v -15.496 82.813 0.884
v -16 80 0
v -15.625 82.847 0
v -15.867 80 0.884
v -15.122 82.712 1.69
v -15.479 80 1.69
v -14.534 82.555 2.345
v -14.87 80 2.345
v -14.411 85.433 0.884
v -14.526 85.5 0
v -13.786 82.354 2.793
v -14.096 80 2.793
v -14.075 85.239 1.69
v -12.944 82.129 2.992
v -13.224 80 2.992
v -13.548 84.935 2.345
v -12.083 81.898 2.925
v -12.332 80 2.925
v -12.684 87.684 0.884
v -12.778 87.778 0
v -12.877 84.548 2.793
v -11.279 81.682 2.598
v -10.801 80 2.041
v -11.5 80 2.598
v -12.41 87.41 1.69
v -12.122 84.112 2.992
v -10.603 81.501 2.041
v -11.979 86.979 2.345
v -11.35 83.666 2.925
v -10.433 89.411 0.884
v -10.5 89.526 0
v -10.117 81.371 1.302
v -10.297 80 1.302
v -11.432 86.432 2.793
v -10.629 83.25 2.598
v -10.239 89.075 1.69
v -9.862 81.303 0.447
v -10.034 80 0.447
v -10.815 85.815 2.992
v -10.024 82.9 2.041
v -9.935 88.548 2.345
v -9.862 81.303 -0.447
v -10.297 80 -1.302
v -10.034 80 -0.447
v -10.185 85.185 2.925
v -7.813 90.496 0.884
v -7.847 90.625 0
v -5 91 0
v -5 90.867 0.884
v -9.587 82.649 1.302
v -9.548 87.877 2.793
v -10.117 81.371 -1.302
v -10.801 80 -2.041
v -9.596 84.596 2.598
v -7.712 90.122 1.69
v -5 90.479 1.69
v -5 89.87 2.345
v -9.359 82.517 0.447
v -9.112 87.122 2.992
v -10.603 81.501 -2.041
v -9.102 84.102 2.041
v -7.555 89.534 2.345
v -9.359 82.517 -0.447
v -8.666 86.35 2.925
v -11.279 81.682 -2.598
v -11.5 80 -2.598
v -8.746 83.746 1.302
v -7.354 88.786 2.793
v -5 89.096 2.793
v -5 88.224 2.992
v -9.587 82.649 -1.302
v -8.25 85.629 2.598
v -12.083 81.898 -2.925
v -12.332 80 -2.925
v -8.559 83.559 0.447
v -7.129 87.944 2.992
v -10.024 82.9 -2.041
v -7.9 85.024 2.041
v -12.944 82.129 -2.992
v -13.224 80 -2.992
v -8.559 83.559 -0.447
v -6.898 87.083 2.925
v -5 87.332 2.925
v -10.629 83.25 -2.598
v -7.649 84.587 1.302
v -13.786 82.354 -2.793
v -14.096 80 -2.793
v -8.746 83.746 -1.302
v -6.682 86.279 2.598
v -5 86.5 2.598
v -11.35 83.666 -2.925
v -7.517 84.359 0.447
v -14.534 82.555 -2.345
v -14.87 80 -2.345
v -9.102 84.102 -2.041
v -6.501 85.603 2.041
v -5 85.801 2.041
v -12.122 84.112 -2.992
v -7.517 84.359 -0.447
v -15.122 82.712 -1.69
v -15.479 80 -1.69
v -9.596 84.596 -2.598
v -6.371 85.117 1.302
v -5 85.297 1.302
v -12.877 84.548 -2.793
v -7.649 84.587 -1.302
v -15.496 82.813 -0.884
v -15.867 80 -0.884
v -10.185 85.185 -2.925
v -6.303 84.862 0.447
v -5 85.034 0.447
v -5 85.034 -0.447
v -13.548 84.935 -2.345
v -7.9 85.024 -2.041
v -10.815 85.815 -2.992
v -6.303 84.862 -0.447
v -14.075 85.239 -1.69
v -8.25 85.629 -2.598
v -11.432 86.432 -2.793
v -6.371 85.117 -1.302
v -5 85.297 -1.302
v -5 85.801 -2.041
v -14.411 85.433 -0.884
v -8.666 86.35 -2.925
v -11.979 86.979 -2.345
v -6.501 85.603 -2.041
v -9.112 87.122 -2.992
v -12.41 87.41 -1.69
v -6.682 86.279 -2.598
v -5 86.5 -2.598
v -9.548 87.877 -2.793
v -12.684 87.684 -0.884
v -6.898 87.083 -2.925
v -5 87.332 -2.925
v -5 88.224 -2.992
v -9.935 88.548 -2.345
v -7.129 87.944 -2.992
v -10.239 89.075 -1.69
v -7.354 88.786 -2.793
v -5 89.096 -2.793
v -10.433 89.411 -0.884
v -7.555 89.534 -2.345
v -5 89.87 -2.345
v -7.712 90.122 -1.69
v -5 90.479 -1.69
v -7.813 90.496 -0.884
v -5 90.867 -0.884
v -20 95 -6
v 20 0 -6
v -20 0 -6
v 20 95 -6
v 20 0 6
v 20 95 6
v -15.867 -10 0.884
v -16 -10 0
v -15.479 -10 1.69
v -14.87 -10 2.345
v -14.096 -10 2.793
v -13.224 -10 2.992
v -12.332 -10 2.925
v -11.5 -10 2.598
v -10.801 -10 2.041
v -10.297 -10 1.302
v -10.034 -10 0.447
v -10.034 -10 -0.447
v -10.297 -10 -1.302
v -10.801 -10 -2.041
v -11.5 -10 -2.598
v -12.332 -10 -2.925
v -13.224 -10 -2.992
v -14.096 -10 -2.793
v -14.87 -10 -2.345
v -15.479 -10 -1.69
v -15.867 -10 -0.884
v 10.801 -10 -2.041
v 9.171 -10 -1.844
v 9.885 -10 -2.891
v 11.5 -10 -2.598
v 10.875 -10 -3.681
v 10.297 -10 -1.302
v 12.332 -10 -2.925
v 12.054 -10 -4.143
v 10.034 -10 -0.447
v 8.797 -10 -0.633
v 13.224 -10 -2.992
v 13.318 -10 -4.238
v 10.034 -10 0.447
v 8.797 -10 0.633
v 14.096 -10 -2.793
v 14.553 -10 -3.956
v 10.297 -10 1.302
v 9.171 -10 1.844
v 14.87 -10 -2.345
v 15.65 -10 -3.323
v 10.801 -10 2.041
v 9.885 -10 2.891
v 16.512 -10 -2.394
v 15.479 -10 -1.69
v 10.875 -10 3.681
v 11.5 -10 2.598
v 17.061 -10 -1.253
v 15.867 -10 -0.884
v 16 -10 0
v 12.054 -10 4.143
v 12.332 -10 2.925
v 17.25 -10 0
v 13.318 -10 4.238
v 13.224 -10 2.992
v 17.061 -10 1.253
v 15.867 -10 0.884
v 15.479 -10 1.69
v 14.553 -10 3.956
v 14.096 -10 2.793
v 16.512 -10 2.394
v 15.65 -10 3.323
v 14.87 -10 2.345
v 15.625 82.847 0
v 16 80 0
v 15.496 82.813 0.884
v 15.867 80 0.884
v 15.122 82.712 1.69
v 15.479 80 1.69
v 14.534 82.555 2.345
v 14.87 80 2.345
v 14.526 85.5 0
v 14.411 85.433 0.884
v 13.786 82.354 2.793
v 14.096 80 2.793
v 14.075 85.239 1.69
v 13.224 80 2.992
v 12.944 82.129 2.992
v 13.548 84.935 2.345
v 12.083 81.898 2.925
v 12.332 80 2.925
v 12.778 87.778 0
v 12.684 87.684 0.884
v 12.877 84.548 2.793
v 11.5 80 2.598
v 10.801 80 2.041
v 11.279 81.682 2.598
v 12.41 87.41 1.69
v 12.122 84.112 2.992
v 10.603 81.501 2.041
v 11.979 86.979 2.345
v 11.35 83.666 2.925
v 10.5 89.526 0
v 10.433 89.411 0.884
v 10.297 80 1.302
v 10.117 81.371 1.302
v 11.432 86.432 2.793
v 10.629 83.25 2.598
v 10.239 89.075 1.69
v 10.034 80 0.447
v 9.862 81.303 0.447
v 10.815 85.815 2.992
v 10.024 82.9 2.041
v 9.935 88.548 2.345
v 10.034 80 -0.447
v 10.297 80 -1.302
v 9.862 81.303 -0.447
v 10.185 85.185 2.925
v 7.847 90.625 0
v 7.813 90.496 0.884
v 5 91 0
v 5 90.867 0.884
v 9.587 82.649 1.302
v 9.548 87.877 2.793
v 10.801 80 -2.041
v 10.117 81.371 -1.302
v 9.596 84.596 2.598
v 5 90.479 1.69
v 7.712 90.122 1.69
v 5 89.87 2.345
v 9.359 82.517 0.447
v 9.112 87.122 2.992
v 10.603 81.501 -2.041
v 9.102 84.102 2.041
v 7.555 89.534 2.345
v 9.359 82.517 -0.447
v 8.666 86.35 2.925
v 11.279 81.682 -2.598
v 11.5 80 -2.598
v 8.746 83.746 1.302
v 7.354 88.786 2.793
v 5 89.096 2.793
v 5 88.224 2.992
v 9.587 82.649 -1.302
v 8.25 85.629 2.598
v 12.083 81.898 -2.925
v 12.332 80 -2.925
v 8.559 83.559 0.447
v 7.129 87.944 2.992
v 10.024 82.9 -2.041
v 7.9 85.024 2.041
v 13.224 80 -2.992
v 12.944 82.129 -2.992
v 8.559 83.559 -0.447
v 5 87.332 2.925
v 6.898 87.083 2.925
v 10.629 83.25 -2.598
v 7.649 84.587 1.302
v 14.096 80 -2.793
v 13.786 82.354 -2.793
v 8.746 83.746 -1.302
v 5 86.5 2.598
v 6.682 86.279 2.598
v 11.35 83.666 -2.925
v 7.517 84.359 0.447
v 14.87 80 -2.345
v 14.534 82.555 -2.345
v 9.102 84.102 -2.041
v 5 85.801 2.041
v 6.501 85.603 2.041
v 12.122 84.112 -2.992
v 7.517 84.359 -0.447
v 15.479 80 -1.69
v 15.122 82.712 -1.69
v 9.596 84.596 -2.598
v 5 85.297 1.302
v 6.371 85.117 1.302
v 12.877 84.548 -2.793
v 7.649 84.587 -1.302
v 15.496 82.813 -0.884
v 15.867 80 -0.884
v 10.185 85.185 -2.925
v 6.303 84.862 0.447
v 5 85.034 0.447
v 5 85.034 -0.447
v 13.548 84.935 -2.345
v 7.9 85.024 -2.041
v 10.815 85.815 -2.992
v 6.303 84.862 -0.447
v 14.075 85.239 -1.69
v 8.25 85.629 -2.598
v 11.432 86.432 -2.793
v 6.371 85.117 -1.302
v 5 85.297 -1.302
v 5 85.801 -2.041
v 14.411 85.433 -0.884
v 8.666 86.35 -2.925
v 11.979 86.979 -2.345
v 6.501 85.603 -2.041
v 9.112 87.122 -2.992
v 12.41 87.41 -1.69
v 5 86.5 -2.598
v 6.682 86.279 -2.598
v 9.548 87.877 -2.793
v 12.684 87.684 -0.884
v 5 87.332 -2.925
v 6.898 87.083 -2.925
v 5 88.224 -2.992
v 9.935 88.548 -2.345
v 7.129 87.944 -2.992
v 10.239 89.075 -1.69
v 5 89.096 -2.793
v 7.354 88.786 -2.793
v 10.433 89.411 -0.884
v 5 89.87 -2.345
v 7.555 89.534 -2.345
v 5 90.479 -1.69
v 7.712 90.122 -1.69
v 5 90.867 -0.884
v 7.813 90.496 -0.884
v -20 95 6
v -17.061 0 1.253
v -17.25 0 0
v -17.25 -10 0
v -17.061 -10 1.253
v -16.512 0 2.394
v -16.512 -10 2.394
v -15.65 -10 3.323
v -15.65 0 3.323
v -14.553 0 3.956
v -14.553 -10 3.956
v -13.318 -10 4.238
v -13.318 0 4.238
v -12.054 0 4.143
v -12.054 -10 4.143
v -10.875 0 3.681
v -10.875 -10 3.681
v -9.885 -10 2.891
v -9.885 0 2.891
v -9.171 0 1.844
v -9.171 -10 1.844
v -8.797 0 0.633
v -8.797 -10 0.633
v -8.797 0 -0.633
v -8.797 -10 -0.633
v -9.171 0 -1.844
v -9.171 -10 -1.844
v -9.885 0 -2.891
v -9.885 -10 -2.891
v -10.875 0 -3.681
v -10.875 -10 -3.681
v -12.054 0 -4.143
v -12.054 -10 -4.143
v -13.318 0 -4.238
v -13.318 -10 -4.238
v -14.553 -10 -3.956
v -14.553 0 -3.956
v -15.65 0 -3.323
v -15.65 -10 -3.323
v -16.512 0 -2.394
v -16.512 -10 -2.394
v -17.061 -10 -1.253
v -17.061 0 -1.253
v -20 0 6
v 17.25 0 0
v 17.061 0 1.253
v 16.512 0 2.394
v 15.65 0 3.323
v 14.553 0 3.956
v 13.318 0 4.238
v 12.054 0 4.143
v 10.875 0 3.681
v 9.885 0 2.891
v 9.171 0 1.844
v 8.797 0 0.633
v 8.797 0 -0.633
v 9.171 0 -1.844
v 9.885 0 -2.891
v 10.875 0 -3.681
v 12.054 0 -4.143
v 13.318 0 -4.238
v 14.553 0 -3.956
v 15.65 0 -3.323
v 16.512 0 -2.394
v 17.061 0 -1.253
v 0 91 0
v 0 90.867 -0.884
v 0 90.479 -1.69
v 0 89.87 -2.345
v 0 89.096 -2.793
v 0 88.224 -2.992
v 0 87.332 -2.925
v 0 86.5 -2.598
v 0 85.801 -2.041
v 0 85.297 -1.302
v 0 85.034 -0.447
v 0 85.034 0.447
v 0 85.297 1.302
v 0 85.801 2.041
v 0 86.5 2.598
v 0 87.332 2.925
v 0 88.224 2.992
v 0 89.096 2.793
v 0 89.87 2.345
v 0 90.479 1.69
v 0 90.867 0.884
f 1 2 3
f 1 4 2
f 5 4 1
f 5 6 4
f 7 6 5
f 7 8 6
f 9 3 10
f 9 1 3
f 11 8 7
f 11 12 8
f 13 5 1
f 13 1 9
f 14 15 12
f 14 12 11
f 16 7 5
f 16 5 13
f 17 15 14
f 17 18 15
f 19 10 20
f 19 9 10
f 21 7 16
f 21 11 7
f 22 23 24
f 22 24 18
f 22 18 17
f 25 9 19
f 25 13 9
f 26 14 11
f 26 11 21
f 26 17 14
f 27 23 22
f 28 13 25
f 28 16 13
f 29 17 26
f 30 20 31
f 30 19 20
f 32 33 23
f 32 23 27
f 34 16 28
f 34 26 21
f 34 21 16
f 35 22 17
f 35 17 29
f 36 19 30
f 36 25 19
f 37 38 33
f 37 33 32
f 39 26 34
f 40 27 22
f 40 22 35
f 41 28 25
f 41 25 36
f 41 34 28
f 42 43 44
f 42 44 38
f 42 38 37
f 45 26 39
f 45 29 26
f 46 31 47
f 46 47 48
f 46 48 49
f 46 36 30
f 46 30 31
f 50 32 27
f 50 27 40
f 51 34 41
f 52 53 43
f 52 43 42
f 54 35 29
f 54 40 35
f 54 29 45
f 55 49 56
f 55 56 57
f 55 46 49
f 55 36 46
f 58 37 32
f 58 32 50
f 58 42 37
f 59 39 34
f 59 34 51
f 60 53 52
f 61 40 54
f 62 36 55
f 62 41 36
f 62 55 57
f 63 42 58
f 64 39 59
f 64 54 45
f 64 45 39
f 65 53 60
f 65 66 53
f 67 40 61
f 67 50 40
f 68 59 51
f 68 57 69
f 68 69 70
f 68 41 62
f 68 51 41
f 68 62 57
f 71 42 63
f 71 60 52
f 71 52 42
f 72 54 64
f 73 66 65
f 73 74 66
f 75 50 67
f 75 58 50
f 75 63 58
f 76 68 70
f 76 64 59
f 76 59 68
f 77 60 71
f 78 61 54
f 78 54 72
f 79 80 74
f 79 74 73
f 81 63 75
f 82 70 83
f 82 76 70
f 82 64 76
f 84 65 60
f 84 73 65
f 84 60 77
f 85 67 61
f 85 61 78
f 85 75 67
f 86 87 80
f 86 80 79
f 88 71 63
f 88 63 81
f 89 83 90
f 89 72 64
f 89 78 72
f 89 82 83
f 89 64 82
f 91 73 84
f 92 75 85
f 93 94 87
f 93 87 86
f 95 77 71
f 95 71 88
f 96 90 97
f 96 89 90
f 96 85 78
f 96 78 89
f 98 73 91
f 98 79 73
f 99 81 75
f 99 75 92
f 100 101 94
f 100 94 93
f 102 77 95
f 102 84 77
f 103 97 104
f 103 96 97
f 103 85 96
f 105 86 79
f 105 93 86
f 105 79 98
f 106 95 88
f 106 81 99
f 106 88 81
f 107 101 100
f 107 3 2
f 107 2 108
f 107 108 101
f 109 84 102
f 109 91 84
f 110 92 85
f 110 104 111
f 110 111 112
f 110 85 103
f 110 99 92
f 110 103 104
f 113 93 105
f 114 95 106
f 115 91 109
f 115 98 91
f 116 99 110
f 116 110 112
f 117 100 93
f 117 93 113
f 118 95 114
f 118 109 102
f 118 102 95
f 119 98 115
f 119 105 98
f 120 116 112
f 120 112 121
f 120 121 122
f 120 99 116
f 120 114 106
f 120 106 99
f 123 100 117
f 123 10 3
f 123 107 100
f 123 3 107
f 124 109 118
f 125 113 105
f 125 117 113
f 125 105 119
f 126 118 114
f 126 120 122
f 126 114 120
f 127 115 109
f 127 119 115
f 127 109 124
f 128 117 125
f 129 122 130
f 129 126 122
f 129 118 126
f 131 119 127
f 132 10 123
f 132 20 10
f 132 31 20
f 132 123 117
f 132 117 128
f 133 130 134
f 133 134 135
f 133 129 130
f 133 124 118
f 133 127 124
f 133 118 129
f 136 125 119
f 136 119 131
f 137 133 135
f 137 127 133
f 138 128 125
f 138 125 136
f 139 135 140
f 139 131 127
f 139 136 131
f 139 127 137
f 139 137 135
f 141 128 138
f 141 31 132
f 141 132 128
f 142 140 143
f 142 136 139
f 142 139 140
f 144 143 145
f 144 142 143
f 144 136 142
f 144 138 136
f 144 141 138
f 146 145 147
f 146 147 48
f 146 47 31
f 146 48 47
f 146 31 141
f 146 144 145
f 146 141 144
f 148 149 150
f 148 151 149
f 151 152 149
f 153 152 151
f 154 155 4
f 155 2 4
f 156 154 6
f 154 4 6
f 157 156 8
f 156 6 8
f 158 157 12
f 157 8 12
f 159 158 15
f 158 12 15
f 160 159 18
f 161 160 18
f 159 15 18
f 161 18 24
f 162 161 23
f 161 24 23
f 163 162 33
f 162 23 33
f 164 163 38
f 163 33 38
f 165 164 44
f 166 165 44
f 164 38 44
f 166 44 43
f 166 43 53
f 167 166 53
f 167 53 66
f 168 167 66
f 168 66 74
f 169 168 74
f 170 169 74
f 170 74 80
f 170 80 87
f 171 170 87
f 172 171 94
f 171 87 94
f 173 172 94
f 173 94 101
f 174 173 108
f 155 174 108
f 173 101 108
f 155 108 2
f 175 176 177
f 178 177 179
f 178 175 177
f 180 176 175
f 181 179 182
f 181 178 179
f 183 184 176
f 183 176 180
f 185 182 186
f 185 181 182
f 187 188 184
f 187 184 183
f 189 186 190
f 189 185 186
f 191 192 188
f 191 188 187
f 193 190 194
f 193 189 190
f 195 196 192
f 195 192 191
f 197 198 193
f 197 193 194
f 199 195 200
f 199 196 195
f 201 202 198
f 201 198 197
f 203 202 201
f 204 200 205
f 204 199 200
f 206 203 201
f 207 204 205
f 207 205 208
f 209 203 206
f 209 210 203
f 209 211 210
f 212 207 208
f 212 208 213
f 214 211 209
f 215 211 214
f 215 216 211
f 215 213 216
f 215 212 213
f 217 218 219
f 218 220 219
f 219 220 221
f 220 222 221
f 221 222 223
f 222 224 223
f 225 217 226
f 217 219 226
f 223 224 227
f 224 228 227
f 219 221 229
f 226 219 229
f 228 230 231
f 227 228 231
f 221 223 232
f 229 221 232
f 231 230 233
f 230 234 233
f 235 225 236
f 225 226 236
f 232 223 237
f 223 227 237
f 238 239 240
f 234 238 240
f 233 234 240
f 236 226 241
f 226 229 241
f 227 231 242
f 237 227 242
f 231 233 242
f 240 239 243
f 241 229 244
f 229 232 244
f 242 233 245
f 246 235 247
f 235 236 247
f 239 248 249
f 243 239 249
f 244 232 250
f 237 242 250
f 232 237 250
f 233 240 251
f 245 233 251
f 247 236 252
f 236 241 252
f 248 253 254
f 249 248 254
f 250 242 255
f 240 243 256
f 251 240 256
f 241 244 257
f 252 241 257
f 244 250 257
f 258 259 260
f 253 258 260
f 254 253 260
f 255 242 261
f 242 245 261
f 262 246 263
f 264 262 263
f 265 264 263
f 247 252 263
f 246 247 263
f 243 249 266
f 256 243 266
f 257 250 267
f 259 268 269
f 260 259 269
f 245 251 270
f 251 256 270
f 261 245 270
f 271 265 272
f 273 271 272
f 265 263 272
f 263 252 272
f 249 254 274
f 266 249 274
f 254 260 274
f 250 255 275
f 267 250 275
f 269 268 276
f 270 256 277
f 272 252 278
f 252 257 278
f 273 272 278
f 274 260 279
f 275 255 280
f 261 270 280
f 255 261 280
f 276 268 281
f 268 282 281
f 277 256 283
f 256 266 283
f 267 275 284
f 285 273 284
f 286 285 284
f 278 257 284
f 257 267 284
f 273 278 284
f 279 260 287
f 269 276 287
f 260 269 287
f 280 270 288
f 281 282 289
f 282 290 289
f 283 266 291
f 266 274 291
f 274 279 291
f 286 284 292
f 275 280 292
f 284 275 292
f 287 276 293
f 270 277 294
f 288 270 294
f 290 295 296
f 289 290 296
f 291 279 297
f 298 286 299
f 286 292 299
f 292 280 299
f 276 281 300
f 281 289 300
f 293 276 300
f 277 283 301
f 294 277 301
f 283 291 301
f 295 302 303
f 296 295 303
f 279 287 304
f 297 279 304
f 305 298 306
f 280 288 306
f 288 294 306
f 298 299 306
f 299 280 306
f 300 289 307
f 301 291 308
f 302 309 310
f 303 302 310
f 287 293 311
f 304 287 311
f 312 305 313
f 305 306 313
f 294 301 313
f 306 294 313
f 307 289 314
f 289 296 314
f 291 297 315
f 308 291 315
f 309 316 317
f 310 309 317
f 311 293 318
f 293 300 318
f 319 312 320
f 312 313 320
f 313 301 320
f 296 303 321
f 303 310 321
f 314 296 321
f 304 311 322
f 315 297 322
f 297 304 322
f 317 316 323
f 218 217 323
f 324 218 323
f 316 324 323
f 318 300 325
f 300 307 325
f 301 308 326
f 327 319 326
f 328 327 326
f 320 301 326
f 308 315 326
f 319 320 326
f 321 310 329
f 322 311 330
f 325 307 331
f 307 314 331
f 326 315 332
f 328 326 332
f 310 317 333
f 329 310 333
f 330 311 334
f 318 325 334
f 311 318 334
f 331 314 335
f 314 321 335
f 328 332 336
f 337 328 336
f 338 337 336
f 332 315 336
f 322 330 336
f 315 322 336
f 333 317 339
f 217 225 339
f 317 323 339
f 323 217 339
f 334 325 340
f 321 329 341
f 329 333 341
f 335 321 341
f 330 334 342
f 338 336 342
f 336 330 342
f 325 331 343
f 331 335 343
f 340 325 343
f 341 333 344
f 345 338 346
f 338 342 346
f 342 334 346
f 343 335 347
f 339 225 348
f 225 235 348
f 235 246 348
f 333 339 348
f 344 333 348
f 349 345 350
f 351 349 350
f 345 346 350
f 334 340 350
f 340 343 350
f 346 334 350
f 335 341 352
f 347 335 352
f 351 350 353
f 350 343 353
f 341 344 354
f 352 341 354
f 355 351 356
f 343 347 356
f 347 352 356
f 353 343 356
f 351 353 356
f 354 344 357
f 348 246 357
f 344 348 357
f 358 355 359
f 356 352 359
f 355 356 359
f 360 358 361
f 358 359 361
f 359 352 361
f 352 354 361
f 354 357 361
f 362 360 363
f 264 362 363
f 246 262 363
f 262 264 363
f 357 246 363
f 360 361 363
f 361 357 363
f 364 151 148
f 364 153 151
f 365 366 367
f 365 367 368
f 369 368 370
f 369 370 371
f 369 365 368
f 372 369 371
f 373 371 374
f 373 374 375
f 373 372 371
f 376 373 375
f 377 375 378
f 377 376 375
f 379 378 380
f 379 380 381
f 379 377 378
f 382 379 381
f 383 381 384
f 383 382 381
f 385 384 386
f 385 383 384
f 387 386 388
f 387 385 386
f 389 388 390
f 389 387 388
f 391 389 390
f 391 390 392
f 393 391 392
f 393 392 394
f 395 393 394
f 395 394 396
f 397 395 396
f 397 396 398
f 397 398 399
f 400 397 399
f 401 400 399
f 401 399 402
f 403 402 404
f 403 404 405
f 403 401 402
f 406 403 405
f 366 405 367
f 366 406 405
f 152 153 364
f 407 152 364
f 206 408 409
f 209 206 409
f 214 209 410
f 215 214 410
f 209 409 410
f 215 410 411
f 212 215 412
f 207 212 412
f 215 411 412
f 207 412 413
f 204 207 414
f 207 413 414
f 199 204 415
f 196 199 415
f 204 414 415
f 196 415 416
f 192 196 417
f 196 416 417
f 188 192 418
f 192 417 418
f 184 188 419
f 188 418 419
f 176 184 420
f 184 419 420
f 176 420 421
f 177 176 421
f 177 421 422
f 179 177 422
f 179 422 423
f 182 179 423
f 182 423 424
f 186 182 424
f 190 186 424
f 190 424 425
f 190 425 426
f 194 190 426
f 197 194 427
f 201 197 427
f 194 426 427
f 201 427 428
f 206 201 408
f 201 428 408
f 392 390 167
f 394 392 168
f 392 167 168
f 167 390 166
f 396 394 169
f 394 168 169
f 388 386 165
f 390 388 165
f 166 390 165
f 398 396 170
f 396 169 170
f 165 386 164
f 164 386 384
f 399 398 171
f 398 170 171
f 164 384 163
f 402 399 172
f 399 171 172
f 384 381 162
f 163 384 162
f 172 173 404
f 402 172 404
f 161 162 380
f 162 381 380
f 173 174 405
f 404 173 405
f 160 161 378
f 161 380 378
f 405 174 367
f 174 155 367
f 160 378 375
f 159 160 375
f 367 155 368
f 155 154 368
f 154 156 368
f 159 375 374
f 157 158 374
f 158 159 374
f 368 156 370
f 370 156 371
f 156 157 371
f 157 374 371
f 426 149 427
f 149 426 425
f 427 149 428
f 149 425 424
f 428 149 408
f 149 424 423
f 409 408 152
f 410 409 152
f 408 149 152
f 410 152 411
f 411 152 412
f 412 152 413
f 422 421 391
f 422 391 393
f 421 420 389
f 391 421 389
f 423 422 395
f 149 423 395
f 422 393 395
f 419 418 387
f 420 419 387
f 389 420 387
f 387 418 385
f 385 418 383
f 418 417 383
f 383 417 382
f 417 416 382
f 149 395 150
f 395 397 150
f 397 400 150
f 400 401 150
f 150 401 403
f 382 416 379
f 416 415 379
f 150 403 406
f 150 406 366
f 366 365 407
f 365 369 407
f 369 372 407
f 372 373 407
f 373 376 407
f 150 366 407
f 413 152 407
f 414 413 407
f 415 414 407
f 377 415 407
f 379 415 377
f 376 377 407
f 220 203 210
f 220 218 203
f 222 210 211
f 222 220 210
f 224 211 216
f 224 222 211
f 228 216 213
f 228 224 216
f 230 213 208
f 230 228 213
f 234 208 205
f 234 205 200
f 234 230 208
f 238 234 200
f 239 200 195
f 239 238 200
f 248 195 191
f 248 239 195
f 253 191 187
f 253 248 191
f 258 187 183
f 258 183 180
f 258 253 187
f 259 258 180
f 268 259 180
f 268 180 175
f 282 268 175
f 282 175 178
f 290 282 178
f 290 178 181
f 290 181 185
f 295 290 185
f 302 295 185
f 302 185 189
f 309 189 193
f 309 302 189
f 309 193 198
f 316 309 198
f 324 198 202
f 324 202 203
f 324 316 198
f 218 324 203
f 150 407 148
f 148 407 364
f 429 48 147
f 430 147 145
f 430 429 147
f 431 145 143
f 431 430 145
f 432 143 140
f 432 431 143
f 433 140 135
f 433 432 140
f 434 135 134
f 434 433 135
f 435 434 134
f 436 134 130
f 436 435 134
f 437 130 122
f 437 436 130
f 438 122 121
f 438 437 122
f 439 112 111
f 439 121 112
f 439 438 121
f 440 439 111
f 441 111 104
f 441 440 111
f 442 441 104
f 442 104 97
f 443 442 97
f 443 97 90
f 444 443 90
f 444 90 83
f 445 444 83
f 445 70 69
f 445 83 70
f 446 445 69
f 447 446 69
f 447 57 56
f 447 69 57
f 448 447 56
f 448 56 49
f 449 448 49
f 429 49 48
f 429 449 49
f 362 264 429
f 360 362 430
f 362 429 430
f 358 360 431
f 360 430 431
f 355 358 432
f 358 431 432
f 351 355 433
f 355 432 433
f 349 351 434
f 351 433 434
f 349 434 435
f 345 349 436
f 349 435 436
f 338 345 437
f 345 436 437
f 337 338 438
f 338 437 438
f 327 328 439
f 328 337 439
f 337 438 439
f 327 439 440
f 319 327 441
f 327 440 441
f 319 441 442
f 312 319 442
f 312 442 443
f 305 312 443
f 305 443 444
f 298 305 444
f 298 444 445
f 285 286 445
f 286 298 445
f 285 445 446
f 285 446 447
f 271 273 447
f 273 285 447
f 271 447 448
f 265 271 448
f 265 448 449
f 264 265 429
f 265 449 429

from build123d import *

# Parameters (mm, degrees)
F0_W     = 20
F0_H     = 95
F1_DEPTH = 6
F3_R     = 3
F5_R     = 4.25
F5_R_2   = 3
F6_DEPTH = 10


with BuildPart() as f1:
    # F0 (on Top) → F1 (new body, symmetric)
    with BuildSketch(Plane.XY):
        with Locations((10, 47.5)):
            Rectangle(F0_W, F0_H)
    extrude(amount=F1_DEPTH, both=True)

    # F4: sweep along a path in F2
    with BuildLine(Plane.XY) as f4_path:
        Line((13, 0), (13, 80))
        ThreePointArc((13, 80), (10.6568542495, 85.6568542495), (5, 88))
        Line((5, 88), (0, 88))
    # F3 (on face) → F4 (sweep, cut)
    with BuildSketch(Plane.XZ):
        with Locations((13, 0)):
            Circle(F3_R)
    sweep(path=f4_path.line, mode=Mode.SUBTRACT)

    # F5 (on face) → F6 (join)
    with BuildSketch(Plane.XZ):
        with Locations((13, 0)):
            Circle(F5_R)
        with Locations((13, 0)):
            Circle(F5_R_2, mode=Mode.SUBTRACT)
    extrude(amount=F6_DEPTH)

    # F7: F1 across face


with BuildPart() as f1_1:
    add(f1.part)
    add(f1.part.mirror(Plane(origin=(0, 46.4699702389, 0), x_dir=(0, -1, 0), z_dir=(-1, 0, 0))))


solid = f1_1.part
